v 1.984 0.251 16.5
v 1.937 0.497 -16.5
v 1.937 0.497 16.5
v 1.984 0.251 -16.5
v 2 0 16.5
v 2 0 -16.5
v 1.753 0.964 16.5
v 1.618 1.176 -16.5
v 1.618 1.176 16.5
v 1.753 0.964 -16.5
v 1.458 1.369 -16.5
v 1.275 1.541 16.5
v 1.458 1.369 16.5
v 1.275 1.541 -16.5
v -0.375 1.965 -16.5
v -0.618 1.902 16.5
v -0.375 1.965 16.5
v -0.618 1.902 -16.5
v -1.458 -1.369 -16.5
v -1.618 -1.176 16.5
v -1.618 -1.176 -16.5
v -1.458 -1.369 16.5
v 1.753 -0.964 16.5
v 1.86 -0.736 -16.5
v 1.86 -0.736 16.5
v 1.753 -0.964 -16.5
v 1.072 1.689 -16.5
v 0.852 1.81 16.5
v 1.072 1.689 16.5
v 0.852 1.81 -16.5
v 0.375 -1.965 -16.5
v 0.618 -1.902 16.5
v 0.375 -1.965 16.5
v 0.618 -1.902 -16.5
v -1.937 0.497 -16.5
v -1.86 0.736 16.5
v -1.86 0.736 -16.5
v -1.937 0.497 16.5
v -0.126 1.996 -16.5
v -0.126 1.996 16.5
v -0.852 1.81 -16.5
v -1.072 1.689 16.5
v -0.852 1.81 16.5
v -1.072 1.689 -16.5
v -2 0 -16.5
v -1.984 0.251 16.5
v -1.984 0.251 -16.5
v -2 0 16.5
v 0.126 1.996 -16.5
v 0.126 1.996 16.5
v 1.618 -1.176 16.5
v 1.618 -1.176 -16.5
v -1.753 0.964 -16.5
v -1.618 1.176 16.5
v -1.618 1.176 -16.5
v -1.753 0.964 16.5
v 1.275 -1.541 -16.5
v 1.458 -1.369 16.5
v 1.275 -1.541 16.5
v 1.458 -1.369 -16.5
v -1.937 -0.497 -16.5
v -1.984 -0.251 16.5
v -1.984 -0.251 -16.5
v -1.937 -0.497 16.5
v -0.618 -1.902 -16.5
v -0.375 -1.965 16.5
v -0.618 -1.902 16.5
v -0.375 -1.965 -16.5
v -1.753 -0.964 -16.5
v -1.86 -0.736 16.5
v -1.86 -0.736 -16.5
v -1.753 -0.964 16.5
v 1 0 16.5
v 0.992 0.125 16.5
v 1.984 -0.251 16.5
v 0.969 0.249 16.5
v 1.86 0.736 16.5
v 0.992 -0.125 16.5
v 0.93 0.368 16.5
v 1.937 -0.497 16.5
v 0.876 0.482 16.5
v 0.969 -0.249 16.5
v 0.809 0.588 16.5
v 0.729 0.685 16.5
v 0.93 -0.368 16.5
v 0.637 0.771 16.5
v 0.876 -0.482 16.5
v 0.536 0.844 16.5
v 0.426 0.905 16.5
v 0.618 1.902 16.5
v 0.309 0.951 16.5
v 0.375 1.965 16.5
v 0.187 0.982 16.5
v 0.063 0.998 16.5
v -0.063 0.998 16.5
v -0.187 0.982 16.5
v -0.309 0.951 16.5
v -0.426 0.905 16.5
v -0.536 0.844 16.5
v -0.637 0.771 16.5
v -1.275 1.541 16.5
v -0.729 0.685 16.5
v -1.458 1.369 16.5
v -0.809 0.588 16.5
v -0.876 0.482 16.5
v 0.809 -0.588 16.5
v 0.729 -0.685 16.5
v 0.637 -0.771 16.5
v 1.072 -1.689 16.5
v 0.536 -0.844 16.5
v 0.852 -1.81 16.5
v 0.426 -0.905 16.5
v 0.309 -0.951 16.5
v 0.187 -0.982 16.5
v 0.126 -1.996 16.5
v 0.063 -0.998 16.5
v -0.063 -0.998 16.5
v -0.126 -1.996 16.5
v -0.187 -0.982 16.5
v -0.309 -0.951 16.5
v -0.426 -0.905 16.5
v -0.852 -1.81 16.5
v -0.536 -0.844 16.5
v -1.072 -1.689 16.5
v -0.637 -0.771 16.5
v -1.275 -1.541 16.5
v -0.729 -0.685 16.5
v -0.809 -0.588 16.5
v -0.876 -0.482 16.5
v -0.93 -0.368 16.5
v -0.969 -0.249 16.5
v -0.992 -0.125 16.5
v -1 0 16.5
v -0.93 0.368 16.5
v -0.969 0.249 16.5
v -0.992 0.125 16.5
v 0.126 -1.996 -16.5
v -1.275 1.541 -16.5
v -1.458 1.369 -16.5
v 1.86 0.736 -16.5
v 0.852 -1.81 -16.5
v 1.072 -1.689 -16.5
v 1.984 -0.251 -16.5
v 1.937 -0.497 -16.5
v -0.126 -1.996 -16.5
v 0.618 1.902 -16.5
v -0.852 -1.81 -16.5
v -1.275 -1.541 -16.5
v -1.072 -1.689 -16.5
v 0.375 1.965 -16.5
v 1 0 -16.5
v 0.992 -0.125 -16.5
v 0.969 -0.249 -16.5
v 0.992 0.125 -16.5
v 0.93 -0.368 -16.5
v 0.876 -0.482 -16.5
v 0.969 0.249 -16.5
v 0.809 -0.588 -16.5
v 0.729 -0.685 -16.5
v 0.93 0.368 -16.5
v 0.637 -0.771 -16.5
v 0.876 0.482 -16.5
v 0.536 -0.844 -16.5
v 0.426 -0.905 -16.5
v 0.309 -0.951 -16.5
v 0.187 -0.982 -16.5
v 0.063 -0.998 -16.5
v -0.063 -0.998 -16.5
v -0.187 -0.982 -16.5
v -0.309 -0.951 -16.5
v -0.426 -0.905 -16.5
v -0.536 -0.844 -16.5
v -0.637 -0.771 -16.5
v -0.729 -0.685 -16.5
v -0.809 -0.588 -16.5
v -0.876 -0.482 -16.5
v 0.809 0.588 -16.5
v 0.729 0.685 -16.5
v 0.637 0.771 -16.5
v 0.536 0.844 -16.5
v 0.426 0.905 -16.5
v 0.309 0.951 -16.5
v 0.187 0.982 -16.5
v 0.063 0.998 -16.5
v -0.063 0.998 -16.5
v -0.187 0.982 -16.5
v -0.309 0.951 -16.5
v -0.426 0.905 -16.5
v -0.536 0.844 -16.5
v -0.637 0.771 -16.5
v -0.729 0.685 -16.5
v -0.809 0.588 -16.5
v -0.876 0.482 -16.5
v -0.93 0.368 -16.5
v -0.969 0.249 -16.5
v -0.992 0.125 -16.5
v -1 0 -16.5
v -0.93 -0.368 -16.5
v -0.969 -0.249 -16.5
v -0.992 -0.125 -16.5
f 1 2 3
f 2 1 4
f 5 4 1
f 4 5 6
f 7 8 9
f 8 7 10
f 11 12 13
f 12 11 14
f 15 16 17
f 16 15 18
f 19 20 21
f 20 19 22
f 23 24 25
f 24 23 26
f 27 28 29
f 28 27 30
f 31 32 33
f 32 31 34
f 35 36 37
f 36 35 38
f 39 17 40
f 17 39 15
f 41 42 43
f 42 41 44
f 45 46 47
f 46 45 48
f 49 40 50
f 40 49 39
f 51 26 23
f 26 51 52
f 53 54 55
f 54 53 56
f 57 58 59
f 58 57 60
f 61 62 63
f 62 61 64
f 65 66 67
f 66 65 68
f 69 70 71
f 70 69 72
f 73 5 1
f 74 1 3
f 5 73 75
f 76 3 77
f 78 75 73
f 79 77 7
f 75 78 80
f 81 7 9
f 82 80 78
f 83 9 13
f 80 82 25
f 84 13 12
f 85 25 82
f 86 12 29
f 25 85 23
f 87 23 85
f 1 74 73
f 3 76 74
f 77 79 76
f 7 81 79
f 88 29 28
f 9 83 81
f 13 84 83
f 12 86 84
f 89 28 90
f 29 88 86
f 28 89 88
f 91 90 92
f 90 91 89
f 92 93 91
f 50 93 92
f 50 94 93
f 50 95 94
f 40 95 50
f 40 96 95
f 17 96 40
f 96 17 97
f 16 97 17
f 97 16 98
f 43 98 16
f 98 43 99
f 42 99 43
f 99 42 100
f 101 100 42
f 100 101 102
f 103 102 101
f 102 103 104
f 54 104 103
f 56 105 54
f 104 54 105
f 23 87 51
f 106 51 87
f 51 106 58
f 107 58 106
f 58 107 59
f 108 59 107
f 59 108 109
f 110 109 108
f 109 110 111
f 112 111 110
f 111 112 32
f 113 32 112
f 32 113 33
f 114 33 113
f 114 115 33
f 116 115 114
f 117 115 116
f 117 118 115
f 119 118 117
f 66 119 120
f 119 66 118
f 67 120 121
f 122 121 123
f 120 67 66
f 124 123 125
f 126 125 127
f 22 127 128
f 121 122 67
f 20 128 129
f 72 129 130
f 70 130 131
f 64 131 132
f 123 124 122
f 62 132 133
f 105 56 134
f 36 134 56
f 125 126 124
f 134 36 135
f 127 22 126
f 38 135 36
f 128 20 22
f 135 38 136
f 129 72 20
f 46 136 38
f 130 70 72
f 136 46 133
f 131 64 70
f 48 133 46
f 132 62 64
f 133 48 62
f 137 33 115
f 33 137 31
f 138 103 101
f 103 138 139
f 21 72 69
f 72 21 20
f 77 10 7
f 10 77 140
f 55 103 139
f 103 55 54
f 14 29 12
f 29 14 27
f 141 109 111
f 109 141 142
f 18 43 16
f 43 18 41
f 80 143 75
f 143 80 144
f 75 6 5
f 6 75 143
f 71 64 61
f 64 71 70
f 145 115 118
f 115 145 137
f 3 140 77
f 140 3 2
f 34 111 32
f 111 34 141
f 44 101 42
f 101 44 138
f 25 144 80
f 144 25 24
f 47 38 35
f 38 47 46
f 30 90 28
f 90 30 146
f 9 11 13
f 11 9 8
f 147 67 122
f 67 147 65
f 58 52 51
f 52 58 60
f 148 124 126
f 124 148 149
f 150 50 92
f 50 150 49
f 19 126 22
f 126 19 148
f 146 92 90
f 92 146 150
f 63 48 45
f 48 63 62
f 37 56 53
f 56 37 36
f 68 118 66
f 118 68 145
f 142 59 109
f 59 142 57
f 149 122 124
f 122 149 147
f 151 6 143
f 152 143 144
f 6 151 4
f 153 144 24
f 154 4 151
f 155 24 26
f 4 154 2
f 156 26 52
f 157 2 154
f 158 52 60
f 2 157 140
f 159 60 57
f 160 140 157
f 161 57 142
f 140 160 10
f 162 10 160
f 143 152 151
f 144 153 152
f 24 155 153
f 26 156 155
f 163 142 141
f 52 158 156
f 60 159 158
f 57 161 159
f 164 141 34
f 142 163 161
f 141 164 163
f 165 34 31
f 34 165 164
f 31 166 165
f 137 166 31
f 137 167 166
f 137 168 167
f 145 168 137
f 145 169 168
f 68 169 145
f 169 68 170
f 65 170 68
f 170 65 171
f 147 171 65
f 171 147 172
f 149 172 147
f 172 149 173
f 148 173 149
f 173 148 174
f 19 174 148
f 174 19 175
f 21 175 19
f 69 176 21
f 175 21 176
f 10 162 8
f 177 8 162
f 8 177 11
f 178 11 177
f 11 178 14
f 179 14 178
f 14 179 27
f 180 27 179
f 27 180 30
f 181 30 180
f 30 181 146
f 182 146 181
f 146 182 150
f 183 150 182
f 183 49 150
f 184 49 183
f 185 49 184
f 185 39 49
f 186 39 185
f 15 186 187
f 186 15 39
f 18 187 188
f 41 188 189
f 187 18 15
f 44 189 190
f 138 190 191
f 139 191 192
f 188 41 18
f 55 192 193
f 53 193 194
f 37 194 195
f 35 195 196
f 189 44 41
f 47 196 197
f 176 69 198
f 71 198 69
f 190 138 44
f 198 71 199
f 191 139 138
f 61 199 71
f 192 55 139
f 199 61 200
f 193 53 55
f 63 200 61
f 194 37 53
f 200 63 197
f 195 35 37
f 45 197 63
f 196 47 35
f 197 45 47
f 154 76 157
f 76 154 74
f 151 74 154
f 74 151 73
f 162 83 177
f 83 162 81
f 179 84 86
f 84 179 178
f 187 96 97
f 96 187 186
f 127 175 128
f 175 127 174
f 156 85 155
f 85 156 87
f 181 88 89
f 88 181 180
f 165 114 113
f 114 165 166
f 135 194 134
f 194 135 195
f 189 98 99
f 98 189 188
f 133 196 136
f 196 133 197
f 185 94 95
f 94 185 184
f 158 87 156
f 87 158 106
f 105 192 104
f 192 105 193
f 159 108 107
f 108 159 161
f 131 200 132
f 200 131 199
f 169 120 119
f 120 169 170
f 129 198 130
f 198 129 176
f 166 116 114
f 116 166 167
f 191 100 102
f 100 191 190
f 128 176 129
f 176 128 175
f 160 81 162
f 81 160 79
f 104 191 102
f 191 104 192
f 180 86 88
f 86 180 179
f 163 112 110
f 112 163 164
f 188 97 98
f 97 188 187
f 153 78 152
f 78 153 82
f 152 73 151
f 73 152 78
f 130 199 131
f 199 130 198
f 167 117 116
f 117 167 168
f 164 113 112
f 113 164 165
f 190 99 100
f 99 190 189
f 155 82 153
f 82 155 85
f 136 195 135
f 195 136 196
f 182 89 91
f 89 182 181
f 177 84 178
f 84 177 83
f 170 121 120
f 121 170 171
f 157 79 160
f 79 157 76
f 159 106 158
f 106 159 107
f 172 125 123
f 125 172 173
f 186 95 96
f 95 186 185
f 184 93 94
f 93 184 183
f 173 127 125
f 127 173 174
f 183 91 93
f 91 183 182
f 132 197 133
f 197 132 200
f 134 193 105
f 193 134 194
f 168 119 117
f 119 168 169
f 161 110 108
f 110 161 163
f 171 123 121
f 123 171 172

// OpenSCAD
$fn = 50;


difference() {
	union() {
		translate(v = [0, 0, -16.5000000000]) {
			cylinder(h = 33, r = 2.0000000000);
		}
	}
	union() {
		translate(v = [0, 0, -100.0000000000]) {
			cylinder(h = 200, r = 1.0000000000);
		}
	}
}
